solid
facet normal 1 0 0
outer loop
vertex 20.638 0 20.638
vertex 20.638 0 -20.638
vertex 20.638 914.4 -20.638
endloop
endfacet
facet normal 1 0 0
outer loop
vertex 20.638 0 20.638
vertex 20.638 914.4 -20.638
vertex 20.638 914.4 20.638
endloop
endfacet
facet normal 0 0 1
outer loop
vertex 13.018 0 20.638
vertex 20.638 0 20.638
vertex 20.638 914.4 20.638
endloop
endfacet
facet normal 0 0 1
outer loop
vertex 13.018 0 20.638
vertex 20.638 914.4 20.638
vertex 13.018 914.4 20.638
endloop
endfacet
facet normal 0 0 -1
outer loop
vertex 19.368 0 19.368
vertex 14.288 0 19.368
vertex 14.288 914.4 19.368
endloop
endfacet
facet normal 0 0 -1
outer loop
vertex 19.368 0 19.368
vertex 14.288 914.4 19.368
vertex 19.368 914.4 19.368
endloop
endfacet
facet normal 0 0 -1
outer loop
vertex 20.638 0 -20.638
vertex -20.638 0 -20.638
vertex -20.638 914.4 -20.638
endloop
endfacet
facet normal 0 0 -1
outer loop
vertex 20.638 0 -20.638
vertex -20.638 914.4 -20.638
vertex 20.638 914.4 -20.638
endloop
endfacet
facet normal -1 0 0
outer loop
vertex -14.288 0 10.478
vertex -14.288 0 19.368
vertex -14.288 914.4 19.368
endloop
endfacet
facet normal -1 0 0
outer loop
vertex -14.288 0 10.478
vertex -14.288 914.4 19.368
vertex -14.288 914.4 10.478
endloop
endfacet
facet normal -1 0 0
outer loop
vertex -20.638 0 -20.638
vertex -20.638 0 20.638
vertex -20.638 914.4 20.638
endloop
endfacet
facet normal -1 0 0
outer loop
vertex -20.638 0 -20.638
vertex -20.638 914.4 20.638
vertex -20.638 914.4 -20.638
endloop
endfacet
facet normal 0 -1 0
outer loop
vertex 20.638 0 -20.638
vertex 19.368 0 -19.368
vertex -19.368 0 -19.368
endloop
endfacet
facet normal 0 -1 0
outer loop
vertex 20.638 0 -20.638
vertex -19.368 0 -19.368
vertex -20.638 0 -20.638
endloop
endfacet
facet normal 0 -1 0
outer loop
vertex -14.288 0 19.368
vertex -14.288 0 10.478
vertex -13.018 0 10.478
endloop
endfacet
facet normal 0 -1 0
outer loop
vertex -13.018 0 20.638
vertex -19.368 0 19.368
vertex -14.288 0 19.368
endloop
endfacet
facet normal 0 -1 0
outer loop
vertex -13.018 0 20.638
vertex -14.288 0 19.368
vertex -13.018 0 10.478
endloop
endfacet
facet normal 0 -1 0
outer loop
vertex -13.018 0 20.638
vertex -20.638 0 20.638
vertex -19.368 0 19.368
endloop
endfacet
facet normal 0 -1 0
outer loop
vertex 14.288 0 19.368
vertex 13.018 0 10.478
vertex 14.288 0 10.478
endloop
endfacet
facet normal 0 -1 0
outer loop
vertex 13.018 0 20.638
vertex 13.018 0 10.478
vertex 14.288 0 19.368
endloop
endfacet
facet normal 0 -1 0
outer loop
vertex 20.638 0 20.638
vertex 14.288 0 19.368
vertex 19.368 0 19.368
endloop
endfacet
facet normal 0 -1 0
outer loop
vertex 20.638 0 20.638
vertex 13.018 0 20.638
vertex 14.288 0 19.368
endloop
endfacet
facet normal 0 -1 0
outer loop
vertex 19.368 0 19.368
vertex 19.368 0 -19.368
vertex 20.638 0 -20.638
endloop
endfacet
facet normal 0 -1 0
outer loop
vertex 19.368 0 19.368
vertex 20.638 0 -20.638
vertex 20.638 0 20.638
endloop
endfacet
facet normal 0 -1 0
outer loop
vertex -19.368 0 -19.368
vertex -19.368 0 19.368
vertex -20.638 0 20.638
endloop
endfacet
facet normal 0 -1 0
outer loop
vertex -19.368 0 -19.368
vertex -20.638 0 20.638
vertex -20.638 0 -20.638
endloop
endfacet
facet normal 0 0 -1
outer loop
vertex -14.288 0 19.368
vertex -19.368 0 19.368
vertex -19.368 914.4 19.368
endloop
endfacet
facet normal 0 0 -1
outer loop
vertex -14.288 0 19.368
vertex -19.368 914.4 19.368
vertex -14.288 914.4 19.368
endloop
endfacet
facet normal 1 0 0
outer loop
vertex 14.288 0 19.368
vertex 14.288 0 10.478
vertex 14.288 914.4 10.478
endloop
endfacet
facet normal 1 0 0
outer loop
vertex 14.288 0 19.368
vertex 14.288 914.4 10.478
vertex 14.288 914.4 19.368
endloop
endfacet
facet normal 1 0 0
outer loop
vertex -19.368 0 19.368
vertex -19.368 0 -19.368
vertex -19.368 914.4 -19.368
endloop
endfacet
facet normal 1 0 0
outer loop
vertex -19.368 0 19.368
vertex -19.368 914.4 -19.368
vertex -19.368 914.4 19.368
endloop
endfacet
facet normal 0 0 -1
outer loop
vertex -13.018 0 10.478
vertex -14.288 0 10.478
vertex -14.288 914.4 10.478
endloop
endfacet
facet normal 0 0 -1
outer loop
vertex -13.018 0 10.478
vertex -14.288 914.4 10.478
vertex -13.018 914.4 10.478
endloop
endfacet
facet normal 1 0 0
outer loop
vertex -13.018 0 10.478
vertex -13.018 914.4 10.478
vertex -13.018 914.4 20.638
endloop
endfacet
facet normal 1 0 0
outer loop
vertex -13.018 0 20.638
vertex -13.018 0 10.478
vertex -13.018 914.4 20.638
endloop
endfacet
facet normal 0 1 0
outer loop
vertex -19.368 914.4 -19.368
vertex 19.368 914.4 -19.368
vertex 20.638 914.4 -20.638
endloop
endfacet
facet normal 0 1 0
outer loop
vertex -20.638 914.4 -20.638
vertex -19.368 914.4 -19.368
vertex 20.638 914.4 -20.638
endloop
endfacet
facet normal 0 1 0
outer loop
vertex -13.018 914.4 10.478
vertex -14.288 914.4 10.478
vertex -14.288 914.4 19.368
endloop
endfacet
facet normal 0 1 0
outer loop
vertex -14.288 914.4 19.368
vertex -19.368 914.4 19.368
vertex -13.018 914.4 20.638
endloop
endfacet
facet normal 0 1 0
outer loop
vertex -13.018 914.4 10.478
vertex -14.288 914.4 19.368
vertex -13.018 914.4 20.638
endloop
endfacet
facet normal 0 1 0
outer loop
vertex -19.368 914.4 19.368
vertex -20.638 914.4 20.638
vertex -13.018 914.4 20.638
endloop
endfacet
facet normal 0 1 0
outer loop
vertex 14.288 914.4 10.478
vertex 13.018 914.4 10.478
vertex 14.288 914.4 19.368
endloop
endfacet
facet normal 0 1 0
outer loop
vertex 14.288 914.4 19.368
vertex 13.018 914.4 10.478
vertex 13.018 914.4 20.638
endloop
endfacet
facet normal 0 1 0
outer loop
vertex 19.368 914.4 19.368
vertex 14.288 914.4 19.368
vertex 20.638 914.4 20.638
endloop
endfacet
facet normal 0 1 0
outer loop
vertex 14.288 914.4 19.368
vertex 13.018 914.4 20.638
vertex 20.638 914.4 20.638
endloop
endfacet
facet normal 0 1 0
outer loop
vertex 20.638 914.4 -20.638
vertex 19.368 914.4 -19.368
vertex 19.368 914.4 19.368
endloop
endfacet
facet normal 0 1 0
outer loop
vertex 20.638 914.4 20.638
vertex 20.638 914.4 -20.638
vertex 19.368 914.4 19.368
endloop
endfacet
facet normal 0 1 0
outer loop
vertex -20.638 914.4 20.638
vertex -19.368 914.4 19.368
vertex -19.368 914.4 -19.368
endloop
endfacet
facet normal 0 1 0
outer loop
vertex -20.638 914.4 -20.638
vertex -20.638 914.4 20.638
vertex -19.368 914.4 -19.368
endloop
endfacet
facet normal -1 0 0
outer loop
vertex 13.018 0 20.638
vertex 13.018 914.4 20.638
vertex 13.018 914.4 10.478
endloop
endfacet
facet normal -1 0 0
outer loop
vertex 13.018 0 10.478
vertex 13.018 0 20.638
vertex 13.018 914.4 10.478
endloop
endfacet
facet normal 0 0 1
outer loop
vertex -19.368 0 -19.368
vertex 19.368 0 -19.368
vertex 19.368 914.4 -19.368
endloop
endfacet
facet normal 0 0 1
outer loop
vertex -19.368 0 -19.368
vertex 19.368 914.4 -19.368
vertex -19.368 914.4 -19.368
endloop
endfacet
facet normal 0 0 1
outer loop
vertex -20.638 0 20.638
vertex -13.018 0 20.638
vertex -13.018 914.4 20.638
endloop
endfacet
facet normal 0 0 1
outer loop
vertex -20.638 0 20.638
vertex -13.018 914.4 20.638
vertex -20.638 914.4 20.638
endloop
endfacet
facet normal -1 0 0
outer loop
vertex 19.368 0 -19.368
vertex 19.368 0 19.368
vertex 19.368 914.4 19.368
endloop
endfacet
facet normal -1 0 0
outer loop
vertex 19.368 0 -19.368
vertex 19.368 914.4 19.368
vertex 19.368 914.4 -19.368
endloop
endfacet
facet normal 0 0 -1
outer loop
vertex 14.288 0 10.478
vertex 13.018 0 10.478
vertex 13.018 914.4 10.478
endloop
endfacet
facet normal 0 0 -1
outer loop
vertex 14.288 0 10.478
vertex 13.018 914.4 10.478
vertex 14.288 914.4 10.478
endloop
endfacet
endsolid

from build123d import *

# Parameters (mm, degrees)
F1_DEPTH = 914.4


with BuildPart() as f1:
    # F0 (on Front) → F1 (new body)
    with BuildSketch(Plane.XZ):
        Polygon((-13.0175, 20.6375), (-20.6375, 20.6375), (-20.6375, -20.6375), (20.6375, -20.6375), (20.6375, 20.6375), (13.0175, 20.6375), (13.0175, 10.4775), (14.2875, 10.4775), (14.2875, 19.3675), (19.3675, 19.3675), (19.3675, -19.3675), (-19.3675, -19.3675), (-19.3675, 19.3675), (-14.2875, 19.3675), (-14.2875, 10.4775), (-13.0175, 10.4775), align=None)
    extrude(amount=-F1_DEPTH)


solid = f1.part
